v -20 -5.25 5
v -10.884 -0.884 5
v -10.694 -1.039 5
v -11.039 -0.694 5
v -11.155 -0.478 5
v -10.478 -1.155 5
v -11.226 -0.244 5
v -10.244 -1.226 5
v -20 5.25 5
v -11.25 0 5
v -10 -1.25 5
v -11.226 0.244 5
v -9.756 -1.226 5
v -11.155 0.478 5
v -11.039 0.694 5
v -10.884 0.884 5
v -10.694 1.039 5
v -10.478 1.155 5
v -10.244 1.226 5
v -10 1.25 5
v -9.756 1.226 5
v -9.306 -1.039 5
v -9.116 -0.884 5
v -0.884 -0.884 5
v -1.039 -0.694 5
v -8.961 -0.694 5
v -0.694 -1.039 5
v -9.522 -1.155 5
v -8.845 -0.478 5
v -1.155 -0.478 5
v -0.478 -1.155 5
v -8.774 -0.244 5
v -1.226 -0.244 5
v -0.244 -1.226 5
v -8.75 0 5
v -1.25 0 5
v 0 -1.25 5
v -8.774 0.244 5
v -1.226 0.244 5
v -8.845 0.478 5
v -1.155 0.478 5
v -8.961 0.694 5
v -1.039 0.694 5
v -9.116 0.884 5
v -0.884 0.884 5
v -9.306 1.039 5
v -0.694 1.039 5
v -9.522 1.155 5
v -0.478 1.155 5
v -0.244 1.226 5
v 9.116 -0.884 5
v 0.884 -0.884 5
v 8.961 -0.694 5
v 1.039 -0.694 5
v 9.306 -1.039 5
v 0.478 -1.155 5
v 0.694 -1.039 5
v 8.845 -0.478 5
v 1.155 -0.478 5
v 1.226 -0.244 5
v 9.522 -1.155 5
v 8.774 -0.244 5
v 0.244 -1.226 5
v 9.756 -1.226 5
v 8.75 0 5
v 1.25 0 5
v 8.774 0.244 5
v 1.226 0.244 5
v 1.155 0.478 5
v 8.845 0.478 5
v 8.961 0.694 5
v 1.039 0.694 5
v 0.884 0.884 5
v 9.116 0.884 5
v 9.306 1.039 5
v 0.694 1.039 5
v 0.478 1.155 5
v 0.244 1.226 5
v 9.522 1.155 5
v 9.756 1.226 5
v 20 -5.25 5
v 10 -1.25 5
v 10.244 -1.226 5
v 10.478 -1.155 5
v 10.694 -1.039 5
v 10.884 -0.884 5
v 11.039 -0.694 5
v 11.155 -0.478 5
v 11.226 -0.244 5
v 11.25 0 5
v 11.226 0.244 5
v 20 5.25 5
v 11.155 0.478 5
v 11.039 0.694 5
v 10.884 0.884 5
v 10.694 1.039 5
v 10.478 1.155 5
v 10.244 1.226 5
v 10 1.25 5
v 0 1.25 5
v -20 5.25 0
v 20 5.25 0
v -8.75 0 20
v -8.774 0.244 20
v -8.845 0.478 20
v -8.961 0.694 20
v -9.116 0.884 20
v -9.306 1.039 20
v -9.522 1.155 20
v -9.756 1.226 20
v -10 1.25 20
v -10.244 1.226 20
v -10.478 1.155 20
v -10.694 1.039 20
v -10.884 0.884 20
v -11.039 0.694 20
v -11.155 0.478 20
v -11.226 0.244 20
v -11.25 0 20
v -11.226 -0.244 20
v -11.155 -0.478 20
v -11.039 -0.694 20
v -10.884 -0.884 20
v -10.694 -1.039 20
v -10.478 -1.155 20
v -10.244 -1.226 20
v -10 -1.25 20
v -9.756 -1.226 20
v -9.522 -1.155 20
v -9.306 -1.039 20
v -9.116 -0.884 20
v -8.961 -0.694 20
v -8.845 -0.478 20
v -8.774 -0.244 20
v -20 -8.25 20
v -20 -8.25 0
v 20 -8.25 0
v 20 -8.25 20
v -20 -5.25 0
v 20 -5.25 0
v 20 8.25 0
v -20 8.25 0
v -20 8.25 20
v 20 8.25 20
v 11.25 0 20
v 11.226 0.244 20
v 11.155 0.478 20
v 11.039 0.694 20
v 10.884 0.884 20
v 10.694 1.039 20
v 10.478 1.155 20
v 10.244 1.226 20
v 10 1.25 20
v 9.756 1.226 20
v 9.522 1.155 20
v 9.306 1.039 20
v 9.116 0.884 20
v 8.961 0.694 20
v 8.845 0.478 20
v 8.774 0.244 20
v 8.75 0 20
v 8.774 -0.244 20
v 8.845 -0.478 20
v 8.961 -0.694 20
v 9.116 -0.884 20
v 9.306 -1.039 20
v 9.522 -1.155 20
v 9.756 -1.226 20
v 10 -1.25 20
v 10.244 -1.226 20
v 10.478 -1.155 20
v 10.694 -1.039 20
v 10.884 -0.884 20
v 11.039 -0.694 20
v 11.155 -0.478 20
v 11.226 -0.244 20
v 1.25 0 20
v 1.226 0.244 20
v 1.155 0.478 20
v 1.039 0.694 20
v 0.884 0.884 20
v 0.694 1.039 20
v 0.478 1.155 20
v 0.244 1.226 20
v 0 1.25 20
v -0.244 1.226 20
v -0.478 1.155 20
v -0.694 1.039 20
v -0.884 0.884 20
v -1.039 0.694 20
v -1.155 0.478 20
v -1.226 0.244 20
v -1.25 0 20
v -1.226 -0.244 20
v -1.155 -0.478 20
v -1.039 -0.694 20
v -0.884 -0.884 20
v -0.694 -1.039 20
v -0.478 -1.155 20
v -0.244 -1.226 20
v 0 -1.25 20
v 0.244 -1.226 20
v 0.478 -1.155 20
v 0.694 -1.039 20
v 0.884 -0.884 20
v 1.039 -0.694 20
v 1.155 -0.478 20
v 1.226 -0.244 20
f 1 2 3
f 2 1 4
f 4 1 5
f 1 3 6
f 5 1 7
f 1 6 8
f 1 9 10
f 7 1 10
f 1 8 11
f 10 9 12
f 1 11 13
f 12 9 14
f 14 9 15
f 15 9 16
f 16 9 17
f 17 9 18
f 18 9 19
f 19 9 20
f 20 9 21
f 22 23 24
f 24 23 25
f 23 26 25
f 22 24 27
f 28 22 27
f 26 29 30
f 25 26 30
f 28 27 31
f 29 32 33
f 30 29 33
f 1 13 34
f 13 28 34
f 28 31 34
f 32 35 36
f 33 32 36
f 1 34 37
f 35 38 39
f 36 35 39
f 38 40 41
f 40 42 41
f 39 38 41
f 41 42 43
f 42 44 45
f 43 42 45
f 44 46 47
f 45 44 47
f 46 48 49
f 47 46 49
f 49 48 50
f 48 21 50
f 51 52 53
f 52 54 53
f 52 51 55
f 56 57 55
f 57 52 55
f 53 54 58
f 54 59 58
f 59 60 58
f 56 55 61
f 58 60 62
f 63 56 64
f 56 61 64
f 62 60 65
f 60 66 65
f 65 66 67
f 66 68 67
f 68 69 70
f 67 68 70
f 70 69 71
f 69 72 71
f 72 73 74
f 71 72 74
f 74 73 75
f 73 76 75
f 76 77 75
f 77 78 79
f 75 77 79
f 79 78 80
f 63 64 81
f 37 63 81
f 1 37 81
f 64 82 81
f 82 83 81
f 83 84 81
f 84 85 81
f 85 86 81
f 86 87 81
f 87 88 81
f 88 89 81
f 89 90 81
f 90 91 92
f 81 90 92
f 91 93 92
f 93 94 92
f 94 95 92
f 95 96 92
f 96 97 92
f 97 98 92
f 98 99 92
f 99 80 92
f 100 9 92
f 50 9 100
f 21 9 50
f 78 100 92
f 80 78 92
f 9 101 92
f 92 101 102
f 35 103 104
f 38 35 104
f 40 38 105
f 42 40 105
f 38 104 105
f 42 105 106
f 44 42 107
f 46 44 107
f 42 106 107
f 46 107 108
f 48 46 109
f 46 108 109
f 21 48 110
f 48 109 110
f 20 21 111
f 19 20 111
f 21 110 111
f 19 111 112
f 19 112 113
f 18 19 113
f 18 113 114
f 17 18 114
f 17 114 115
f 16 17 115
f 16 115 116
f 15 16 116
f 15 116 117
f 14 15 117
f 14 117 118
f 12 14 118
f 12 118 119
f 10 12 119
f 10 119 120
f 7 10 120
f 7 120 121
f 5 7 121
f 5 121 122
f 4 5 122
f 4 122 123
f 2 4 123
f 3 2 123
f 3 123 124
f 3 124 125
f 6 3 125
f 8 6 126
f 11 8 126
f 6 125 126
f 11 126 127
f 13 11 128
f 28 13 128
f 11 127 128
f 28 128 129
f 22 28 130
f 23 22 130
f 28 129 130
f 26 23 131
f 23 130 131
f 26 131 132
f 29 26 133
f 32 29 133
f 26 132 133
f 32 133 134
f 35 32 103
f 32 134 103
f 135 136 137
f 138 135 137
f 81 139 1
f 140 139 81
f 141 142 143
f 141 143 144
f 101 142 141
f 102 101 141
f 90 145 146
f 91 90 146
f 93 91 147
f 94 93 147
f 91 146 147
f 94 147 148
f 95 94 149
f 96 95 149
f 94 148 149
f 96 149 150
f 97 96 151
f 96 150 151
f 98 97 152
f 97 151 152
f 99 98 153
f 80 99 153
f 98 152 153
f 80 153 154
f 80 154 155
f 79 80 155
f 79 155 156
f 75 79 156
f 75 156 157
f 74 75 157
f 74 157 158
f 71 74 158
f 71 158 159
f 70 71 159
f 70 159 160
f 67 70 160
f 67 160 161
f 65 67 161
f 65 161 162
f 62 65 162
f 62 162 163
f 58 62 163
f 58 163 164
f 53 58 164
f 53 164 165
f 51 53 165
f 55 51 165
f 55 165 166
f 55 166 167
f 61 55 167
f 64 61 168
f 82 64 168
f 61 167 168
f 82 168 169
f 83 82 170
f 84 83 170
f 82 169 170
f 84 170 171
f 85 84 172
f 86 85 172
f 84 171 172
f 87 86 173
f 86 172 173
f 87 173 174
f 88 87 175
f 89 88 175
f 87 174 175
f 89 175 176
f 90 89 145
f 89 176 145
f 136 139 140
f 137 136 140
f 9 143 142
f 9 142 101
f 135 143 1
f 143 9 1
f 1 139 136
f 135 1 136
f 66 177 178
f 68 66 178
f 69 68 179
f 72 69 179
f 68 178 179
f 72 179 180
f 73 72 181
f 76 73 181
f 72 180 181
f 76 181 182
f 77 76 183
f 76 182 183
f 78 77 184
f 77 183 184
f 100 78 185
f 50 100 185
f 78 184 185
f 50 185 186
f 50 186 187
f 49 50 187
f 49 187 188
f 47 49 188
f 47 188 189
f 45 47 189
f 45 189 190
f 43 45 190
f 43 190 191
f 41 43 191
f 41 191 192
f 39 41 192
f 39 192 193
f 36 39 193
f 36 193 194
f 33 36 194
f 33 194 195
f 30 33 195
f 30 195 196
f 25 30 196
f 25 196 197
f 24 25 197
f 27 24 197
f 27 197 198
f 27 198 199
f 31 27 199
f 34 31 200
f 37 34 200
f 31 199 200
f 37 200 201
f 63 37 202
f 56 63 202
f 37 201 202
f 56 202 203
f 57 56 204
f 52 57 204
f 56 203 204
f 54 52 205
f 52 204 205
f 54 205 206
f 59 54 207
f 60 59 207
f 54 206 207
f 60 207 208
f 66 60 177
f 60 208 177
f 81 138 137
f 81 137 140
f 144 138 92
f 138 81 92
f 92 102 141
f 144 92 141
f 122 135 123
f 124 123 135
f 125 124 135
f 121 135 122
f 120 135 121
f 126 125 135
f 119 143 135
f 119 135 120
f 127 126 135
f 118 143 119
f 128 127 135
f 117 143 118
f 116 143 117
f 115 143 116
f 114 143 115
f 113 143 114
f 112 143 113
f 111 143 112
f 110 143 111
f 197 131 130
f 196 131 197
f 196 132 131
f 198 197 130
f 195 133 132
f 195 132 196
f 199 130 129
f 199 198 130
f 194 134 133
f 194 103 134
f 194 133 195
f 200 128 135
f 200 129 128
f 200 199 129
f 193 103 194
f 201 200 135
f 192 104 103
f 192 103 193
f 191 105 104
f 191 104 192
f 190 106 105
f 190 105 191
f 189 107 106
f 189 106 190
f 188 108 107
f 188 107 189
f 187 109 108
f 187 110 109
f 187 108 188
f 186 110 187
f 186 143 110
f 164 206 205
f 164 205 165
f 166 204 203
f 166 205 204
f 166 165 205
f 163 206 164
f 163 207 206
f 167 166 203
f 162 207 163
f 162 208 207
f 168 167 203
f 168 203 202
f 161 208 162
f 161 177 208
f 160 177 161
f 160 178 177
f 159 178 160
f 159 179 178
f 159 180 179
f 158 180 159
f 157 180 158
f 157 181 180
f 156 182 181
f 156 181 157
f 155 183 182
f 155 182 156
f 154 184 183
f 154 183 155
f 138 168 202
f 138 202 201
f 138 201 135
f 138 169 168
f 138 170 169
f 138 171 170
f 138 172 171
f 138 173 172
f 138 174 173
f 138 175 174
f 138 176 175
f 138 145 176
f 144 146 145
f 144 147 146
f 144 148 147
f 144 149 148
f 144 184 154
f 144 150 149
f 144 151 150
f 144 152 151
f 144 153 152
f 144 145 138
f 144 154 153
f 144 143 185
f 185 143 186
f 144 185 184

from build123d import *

# Parameters (mm, degrees)
F0_W     = 40
F0_H     = 3
F0_H_2   = 10.5
F1_DEPTH = 20
F2_DEPTH = 5
F3_R     = 1.25
F4_DEPTH = 20.001
F5_DEPTH = 20.001


with BuildPart() as f1:
    # F0 (on Top) → F1 (new body)
    with BuildSketch(Plane.XY):
        with Locations((0, 6.75)):
            Rectangle(F0_W, F0_H)
        Rectangle(F0_W, F0_H_2)
        with Locations((0, -6.75)):
            Rectangle(F0_W, F0_H)
    extrude(amount=F1_DEPTH)

    # F0 (on Top) → F2 (cut)
    with BuildSketch(Plane.XY):
        Rectangle(F0_W, F0_H_2)
    extrude(amount=F2_DEPTH, mode=Mode.SUBTRACT)

    # F3 (on face) → F4 (cut, through all)
    with BuildSketch(Plane.XY.offset(20)):
        Circle(F3_R)
    extrude(amount=-F4_DEPTH, mode=Mode.SUBTRACT)

    # F3 (on face) → F5 (cut, through all)
    with BuildSketch(Plane.XY.offset(20)):
        with Locations((10, 0)):
            Circle(F3_R)
        Circle(F3_R)
        with Locations((-10, 0)):
            Circle(F3_R)
    extrude(amount=-F5_DEPTH, mode=Mode.SUBTRACT)


solid = f1.part
